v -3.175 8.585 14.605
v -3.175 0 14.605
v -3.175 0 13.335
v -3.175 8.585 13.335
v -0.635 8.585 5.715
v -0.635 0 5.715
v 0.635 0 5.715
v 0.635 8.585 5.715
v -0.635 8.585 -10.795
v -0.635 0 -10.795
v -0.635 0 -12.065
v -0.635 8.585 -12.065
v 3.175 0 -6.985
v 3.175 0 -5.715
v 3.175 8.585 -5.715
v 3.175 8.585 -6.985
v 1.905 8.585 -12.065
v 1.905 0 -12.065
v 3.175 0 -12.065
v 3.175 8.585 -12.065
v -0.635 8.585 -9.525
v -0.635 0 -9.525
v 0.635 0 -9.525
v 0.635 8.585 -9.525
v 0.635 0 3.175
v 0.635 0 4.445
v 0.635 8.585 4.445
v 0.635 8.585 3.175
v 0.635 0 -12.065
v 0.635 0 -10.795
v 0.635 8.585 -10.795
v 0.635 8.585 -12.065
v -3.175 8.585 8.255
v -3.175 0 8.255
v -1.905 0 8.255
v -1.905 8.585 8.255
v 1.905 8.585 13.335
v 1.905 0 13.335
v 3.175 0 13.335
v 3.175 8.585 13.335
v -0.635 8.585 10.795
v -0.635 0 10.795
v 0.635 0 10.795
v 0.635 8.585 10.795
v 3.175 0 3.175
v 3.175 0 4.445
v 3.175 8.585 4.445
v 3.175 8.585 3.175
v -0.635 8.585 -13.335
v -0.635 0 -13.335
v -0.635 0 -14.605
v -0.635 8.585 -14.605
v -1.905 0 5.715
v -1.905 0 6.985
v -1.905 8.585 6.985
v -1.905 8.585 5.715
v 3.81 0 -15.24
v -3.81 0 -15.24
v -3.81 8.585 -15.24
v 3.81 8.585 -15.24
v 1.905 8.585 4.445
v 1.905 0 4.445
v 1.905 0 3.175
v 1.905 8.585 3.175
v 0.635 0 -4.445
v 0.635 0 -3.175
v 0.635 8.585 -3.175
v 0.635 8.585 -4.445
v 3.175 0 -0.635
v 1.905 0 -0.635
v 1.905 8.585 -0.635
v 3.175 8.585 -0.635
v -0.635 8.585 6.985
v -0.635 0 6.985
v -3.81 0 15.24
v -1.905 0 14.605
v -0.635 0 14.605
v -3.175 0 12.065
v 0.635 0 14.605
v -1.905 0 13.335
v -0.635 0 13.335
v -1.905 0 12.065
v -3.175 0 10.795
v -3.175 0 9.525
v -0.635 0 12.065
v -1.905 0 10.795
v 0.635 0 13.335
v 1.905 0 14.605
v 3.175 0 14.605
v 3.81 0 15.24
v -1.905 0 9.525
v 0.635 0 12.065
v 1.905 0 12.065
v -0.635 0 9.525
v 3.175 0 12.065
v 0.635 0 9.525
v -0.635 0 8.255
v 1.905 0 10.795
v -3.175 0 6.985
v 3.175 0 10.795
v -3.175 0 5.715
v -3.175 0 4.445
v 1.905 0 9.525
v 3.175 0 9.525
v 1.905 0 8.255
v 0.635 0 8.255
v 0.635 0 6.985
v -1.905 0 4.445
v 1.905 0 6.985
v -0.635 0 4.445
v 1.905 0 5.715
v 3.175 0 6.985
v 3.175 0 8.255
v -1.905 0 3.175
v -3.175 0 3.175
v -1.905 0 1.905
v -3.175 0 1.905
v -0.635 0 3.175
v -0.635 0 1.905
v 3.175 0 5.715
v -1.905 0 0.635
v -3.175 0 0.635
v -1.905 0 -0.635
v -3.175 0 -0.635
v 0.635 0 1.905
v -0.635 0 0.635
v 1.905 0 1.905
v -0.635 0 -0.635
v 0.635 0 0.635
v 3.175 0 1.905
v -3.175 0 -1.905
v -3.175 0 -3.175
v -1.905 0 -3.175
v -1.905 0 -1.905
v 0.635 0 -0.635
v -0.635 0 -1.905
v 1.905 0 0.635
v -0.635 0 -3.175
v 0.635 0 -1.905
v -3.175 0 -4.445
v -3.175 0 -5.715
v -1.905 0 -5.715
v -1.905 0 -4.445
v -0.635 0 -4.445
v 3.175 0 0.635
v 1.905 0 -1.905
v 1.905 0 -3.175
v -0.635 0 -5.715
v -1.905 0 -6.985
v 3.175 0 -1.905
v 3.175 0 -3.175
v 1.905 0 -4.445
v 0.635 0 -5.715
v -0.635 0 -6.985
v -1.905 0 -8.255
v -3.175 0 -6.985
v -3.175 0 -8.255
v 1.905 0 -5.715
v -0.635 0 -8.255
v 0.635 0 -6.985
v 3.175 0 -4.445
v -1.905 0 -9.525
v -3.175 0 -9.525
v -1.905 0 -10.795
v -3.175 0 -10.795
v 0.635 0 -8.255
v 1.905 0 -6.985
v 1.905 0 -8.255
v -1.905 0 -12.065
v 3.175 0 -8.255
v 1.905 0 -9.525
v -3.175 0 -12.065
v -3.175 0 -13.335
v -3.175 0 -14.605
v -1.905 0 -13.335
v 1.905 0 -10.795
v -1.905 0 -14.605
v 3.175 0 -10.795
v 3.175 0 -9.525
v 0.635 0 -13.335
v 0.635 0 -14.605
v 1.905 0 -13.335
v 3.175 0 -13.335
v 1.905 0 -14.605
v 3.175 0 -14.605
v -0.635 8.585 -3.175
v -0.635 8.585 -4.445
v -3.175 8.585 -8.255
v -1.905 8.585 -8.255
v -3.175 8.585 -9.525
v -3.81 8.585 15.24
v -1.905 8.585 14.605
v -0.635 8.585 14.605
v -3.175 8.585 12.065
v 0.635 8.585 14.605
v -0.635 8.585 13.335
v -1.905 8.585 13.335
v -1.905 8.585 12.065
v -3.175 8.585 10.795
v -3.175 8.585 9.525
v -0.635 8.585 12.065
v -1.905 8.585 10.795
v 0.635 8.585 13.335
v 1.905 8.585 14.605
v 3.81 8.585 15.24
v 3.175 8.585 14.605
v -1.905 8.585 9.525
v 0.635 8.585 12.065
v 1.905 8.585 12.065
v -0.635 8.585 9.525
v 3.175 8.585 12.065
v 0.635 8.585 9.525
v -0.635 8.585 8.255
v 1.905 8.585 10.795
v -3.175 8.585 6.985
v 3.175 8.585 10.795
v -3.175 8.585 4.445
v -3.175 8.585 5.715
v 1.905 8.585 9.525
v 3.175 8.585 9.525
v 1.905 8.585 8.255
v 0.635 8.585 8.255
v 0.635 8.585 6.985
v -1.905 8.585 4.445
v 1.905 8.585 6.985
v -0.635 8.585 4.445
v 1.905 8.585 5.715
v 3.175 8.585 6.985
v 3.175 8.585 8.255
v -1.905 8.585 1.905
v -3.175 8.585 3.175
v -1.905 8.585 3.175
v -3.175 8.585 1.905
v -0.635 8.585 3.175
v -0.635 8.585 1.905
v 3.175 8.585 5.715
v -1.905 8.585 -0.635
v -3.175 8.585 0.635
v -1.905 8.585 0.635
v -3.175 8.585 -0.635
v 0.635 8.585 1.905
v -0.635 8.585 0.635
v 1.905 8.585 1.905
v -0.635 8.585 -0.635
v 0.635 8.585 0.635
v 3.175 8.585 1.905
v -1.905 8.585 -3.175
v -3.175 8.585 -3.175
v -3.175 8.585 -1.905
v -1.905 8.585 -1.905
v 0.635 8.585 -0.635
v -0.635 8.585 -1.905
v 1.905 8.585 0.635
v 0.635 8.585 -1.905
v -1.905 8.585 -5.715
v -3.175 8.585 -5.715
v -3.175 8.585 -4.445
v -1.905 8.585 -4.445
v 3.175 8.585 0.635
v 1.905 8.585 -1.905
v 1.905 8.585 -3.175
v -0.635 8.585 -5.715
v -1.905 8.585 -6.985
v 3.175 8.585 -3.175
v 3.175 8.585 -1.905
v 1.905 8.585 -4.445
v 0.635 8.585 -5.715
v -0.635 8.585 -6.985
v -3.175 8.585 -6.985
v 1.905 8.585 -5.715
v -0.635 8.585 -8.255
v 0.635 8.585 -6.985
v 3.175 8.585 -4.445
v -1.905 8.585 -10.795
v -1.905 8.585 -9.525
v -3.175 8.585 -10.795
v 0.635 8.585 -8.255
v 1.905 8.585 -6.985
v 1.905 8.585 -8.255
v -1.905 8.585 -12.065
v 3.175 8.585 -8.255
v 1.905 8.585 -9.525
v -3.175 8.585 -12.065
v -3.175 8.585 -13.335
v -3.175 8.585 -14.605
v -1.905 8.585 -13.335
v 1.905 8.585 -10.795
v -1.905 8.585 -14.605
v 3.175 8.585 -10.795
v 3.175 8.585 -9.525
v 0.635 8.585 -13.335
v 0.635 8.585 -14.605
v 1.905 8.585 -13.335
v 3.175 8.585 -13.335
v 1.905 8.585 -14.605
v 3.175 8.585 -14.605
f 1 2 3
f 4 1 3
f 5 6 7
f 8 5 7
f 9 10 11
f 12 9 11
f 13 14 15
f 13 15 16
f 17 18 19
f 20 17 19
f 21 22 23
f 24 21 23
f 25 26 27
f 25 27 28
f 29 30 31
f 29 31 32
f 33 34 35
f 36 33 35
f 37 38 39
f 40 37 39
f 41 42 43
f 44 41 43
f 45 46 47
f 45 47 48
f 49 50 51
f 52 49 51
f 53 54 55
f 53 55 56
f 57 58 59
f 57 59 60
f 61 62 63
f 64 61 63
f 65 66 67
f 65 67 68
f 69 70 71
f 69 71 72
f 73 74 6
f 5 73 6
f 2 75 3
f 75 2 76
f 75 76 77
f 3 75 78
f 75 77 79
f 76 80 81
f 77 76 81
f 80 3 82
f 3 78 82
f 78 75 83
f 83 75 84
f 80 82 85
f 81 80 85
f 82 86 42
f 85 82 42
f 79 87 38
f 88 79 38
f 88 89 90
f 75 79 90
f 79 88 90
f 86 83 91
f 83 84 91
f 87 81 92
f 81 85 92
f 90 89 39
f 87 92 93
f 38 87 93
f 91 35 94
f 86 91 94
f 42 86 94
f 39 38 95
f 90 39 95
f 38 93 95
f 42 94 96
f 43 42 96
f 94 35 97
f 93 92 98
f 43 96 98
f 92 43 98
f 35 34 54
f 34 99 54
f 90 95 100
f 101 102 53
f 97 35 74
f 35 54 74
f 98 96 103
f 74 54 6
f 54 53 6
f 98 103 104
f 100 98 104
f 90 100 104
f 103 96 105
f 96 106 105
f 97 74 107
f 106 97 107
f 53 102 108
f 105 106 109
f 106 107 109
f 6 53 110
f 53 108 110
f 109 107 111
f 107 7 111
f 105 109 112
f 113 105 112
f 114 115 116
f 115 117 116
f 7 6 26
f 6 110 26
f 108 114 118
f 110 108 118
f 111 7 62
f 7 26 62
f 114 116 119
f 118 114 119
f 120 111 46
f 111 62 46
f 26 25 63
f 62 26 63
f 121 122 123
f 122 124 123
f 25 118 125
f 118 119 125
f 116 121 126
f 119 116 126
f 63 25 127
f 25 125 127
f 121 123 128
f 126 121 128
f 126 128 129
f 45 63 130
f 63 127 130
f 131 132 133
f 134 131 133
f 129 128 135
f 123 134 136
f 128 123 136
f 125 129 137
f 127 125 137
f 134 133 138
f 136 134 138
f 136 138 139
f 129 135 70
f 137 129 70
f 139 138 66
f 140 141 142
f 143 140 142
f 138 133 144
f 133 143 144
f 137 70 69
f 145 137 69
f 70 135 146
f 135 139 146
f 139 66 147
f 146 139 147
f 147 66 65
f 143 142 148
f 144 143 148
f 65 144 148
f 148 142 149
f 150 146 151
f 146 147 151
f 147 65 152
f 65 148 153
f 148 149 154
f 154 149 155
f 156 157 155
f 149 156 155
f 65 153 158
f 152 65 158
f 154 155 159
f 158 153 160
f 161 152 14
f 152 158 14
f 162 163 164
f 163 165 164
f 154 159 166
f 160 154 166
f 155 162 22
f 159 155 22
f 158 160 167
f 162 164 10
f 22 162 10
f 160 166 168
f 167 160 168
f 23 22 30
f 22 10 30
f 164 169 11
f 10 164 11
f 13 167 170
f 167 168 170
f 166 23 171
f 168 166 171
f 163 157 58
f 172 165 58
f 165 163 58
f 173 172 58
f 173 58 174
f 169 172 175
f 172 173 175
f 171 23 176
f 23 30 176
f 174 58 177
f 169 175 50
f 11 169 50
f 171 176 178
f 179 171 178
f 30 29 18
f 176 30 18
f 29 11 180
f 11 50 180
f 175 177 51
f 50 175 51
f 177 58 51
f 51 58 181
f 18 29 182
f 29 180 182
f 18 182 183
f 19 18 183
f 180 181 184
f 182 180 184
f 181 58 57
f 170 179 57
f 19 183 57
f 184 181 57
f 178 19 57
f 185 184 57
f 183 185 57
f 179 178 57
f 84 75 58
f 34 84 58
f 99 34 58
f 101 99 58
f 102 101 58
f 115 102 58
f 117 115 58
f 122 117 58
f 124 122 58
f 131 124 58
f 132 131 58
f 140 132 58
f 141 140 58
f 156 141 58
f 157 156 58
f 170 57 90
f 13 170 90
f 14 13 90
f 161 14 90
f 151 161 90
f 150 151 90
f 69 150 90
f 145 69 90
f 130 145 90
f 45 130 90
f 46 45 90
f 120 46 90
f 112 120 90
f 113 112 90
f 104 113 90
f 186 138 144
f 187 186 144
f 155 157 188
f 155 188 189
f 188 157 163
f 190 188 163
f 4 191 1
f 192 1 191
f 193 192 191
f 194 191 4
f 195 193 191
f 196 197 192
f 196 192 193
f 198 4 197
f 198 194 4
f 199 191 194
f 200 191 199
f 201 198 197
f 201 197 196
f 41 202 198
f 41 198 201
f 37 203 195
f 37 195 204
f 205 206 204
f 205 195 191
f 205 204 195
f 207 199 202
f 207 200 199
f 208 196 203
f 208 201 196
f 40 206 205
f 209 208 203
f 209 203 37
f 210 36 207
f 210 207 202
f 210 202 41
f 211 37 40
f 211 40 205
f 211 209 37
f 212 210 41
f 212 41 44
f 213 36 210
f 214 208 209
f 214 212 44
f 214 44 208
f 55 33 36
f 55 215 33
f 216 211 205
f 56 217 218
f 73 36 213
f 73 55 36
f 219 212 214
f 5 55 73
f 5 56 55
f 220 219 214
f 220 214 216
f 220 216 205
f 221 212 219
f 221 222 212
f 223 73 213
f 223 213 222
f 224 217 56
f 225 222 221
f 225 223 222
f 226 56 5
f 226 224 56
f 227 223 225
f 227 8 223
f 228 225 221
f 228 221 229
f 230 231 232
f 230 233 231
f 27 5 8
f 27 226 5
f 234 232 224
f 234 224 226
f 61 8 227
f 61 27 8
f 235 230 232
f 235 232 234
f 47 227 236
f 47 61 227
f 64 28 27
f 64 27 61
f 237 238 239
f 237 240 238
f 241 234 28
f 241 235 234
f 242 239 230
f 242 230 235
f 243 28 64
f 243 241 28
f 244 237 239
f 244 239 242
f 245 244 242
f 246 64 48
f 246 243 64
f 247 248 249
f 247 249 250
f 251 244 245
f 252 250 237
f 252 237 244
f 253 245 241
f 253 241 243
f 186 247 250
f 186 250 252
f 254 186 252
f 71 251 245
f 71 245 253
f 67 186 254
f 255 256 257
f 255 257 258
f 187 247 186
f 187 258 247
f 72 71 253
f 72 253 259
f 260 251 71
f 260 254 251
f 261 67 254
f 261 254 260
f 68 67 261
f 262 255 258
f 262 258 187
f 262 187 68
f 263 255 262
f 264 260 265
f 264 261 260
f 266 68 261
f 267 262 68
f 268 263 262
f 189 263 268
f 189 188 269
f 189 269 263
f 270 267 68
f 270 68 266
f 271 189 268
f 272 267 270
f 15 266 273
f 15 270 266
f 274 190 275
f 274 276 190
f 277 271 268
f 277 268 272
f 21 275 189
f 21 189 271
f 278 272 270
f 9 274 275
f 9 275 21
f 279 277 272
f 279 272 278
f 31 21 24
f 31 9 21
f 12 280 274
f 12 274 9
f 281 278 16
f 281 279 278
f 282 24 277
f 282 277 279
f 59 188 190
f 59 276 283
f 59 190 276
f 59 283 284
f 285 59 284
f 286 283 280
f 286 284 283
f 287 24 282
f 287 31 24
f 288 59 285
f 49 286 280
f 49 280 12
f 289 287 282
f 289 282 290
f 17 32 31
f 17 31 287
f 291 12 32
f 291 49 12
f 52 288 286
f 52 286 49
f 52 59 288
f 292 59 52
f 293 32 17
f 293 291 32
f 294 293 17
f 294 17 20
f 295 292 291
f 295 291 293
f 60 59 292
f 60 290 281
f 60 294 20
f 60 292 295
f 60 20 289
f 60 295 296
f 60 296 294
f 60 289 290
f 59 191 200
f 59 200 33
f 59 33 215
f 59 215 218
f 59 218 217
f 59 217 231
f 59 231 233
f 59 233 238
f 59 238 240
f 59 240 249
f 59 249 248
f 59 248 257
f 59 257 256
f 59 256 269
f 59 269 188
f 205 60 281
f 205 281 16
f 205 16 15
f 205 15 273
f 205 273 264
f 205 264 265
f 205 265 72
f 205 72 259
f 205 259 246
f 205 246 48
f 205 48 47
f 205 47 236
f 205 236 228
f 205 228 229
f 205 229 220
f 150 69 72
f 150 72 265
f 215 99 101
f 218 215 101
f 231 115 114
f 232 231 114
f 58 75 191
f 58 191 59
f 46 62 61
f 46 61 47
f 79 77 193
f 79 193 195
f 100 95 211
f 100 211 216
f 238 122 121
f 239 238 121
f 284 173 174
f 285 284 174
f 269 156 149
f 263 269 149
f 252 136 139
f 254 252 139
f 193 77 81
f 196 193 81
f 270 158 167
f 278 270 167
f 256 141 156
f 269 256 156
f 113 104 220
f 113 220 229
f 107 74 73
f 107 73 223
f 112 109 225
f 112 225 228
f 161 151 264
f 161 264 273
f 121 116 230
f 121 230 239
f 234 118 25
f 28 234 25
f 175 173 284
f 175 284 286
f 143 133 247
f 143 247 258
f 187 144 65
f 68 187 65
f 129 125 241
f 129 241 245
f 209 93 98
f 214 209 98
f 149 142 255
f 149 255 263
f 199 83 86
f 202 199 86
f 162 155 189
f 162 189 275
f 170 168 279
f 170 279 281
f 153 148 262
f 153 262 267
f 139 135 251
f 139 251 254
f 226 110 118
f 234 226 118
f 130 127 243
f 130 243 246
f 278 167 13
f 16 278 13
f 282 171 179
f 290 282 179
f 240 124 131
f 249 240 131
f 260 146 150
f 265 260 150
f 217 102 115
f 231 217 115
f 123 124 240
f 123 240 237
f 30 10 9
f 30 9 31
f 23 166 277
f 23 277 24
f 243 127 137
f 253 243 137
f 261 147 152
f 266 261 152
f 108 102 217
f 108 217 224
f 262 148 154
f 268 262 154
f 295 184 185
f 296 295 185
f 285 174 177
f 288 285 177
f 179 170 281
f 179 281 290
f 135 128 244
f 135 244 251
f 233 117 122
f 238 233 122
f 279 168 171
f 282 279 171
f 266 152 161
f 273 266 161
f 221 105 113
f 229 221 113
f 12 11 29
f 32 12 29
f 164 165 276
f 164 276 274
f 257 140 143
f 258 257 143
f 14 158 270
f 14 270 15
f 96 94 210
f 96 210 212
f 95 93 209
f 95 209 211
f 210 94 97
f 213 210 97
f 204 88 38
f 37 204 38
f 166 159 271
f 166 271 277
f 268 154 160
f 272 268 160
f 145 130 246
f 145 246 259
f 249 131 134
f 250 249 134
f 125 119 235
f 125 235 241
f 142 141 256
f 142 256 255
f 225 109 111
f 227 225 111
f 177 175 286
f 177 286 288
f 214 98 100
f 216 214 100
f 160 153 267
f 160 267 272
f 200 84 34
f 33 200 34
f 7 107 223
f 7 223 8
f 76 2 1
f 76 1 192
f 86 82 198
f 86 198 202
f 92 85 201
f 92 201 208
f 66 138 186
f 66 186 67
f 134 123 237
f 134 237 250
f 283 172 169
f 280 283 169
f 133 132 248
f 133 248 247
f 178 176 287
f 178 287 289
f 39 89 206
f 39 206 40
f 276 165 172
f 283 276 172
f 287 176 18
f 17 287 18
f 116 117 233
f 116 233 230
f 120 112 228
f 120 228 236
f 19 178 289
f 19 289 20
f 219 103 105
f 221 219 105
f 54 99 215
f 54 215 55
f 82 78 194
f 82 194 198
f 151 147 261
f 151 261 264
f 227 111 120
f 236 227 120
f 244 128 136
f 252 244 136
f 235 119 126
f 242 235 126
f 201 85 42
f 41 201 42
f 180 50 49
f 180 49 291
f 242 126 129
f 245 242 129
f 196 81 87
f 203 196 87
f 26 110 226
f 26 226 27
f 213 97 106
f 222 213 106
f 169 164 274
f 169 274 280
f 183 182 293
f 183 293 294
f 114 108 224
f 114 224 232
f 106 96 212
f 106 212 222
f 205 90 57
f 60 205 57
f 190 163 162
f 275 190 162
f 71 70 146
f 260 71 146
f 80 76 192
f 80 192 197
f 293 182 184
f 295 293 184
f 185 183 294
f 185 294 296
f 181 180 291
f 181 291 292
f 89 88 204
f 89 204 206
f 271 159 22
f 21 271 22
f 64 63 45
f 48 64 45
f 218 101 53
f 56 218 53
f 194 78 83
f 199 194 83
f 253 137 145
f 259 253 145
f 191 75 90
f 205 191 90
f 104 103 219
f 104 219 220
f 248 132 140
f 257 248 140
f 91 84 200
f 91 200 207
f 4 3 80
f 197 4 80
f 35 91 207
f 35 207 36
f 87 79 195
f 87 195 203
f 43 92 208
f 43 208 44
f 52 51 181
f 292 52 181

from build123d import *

# Parameters (mm, degrees)
SKETCH1_W           = 7.62
SKETCH1_H           = 30.48
SKETCH1_W_2         = 1.27
SKETCH1_H_2         = 1.27
BOSS_EXTRUDE1_DEPTH = 8.5852


with BuildPart() as part:
    # Sketch1 → Boss-Extrude1 (new body)
    with BuildSketch(Plane(origin=(0, 0, 0), x_dir=(1, 0, 0), z_dir=(0, 1, 0))):
        Rectangle(SKETCH1_W, SKETCH1_H)
        with Locations((-2.54, 13.97)):
            Rectangle(SKETCH1_W_2, SKETCH1_H_2, mode=Mode.SUBTRACT)
        with Locations((0, 13.97)):
            Rectangle(SKETCH1_W_2, SKETCH1_H_2, mode=Mode.SUBTRACT)
        with Locations((2.54, 13.97)):
            Rectangle(SKETCH1_W_2, SKETCH1_H_2, mode=Mode.SUBTRACT)
        with Locations((-2.54, 11.43)):
            Rectangle(SKETCH1_W_2, SKETCH1_H_2, mode=Mode.SUBTRACT)
        with Locations((0, 11.43)):
            Rectangle(SKETCH1_W_2, SKETCH1_H_2, mode=Mode.SUBTRACT)
        with Locations((2.54, 11.43)):
            Rectangle(SKETCH1_W_2, SKETCH1_H_2, mode=Mode.SUBTRACT)
        with Locations((-2.54, 8.89)):
            Rectangle(SKETCH1_W_2, SKETCH1_H_2, mode=Mode.SUBTRACT)
        with Locations((0, 8.89)):
            Rectangle(SKETCH1_W_2, SKETCH1_H_2, mode=Mode.SUBTRACT)
        with Locations((2.54, 8.89)):
            Rectangle(SKETCH1_W_2, SKETCH1_H_2, mode=Mode.SUBTRACT)
        with Locations((-2.54, 6.35)):
            Rectangle(SKETCH1_W_2, SKETCH1_H_2, mode=Mode.SUBTRACT)
        with Locations((0, 6.35)):
            Rectangle(SKETCH1_W_2, SKETCH1_H_2, mode=Mode.SUBTRACT)
        with Locations((2.54, 6.35)):
            Rectangle(SKETCH1_W_2, SKETCH1_H_2, mode=Mode.SUBTRACT)
        with Locations((-2.54, 3.81)):
            Rectangle(SKETCH1_W_2, SKETCH1_H_2, mode=Mode.SUBTRACT)
        with Locations((0, 3.81)):
            Rectangle(SKETCH1_W_2, SKETCH1_H_2, mode=Mode.SUBTRACT)
        with Locations((2.54, 3.81)):
            Rectangle(SKETCH1_W_2, SKETCH1_H_2, mode=Mode.SUBTRACT)
        with Locations((-2.54, 1.27)):
            Rectangle(SKETCH1_W_2, SKETCH1_H_2, mode=Mode.SUBTRACT)
        with Locations((0, 1.27)):
            Rectangle(SKETCH1_W_2, SKETCH1_H_2, mode=Mode.SUBTRACT)
        with Locations((2.54, 1.27)):
            Rectangle(SKETCH1_W_2, SKETCH1_H_2, mode=Mode.SUBTRACT)
        with Locations((-2.54, -1.27)):
            Rectangle(SKETCH1_W_2, SKETCH1_H_2, mode=Mode.SUBTRACT)
        with Locations((0, -1.27)):
            Rectangle(SKETCH1_W_2, SKETCH1_H_2, mode=Mode.SUBTRACT)
        with Locations((2.54, -1.27)):
            Rectangle(SKETCH1_W_2, SKETCH1_H_2, mode=Mode.SUBTRACT)
        with Locations((-2.54, -3.81)):
            Rectangle(SKETCH1_W_2, SKETCH1_H_2, mode=Mode.SUBTRACT)
        with Locations((0, -3.81)):
            Rectangle(SKETCH1_W_2, SKETCH1_H_2, mode=Mode.SUBTRACT)
        with Locations((2.54, -3.81)):
            Rectangle(SKETCH1_W_2, SKETCH1_H_2, mode=Mode.SUBTRACT)
        with Locations((-2.54, -6.35)):
            Rectangle(SKETCH1_W_2, SKETCH1_H_2, mode=Mode.SUBTRACT)
        with Locations((0, -6.35)):
            Rectangle(SKETCH1_W_2, SKETCH1_H_2, mode=Mode.SUBTRACT)
        with Locations((2.54, -6.35)):
            Rectangle(SKETCH1_W_2, SKETCH1_H_2, mode=Mode.SUBTRACT)
        with Locations((-2.54, -8.89)):
            Rectangle(SKETCH1_W_2, SKETCH1_H_2, mode=Mode.SUBTRACT)
        with Locations((0, -8.89)):
            Rectangle(SKETCH1_W_2, SKETCH1_H_2, mode=Mode.SUBTRACT)
        with Locations((2.54, -8.89)):
            Rectangle(SKETCH1_W_2, SKETCH1_H_2, mode=Mode.SUBTRACT)
        with Locations((-2.54, -11.43)):
            Rectangle(SKETCH1_W_2, SKETCH1_H_2, mode=Mode.SUBTRACT)
        with Locations((0, -11.43)):
            Rectangle(SKETCH1_W_2, SKETCH1_H_2, mode=Mode.SUBTRACT)
        with Locations((2.54, -11.43)):
            Rectangle(SKETCH1_W_2, SKETCH1_H_2, mode=Mode.SUBTRACT)
        with Locations((-2.54, -13.97)):
            Rectangle(SKETCH1_W_2, SKETCH1_H_2, mode=Mode.SUBTRACT)
        with Locations((0, -13.97)):
            Rectangle(SKETCH1_W_2, SKETCH1_H_2, mode=Mode.SUBTRACT)
        with Locations((2.54, -13.97)):
            Rectangle(SKETCH1_W_2, SKETCH1_H_2, mode=Mode.SUBTRACT)
    extrude(amount=BOSS_EXTRUDE1_DEPTH)


solid = part.part
